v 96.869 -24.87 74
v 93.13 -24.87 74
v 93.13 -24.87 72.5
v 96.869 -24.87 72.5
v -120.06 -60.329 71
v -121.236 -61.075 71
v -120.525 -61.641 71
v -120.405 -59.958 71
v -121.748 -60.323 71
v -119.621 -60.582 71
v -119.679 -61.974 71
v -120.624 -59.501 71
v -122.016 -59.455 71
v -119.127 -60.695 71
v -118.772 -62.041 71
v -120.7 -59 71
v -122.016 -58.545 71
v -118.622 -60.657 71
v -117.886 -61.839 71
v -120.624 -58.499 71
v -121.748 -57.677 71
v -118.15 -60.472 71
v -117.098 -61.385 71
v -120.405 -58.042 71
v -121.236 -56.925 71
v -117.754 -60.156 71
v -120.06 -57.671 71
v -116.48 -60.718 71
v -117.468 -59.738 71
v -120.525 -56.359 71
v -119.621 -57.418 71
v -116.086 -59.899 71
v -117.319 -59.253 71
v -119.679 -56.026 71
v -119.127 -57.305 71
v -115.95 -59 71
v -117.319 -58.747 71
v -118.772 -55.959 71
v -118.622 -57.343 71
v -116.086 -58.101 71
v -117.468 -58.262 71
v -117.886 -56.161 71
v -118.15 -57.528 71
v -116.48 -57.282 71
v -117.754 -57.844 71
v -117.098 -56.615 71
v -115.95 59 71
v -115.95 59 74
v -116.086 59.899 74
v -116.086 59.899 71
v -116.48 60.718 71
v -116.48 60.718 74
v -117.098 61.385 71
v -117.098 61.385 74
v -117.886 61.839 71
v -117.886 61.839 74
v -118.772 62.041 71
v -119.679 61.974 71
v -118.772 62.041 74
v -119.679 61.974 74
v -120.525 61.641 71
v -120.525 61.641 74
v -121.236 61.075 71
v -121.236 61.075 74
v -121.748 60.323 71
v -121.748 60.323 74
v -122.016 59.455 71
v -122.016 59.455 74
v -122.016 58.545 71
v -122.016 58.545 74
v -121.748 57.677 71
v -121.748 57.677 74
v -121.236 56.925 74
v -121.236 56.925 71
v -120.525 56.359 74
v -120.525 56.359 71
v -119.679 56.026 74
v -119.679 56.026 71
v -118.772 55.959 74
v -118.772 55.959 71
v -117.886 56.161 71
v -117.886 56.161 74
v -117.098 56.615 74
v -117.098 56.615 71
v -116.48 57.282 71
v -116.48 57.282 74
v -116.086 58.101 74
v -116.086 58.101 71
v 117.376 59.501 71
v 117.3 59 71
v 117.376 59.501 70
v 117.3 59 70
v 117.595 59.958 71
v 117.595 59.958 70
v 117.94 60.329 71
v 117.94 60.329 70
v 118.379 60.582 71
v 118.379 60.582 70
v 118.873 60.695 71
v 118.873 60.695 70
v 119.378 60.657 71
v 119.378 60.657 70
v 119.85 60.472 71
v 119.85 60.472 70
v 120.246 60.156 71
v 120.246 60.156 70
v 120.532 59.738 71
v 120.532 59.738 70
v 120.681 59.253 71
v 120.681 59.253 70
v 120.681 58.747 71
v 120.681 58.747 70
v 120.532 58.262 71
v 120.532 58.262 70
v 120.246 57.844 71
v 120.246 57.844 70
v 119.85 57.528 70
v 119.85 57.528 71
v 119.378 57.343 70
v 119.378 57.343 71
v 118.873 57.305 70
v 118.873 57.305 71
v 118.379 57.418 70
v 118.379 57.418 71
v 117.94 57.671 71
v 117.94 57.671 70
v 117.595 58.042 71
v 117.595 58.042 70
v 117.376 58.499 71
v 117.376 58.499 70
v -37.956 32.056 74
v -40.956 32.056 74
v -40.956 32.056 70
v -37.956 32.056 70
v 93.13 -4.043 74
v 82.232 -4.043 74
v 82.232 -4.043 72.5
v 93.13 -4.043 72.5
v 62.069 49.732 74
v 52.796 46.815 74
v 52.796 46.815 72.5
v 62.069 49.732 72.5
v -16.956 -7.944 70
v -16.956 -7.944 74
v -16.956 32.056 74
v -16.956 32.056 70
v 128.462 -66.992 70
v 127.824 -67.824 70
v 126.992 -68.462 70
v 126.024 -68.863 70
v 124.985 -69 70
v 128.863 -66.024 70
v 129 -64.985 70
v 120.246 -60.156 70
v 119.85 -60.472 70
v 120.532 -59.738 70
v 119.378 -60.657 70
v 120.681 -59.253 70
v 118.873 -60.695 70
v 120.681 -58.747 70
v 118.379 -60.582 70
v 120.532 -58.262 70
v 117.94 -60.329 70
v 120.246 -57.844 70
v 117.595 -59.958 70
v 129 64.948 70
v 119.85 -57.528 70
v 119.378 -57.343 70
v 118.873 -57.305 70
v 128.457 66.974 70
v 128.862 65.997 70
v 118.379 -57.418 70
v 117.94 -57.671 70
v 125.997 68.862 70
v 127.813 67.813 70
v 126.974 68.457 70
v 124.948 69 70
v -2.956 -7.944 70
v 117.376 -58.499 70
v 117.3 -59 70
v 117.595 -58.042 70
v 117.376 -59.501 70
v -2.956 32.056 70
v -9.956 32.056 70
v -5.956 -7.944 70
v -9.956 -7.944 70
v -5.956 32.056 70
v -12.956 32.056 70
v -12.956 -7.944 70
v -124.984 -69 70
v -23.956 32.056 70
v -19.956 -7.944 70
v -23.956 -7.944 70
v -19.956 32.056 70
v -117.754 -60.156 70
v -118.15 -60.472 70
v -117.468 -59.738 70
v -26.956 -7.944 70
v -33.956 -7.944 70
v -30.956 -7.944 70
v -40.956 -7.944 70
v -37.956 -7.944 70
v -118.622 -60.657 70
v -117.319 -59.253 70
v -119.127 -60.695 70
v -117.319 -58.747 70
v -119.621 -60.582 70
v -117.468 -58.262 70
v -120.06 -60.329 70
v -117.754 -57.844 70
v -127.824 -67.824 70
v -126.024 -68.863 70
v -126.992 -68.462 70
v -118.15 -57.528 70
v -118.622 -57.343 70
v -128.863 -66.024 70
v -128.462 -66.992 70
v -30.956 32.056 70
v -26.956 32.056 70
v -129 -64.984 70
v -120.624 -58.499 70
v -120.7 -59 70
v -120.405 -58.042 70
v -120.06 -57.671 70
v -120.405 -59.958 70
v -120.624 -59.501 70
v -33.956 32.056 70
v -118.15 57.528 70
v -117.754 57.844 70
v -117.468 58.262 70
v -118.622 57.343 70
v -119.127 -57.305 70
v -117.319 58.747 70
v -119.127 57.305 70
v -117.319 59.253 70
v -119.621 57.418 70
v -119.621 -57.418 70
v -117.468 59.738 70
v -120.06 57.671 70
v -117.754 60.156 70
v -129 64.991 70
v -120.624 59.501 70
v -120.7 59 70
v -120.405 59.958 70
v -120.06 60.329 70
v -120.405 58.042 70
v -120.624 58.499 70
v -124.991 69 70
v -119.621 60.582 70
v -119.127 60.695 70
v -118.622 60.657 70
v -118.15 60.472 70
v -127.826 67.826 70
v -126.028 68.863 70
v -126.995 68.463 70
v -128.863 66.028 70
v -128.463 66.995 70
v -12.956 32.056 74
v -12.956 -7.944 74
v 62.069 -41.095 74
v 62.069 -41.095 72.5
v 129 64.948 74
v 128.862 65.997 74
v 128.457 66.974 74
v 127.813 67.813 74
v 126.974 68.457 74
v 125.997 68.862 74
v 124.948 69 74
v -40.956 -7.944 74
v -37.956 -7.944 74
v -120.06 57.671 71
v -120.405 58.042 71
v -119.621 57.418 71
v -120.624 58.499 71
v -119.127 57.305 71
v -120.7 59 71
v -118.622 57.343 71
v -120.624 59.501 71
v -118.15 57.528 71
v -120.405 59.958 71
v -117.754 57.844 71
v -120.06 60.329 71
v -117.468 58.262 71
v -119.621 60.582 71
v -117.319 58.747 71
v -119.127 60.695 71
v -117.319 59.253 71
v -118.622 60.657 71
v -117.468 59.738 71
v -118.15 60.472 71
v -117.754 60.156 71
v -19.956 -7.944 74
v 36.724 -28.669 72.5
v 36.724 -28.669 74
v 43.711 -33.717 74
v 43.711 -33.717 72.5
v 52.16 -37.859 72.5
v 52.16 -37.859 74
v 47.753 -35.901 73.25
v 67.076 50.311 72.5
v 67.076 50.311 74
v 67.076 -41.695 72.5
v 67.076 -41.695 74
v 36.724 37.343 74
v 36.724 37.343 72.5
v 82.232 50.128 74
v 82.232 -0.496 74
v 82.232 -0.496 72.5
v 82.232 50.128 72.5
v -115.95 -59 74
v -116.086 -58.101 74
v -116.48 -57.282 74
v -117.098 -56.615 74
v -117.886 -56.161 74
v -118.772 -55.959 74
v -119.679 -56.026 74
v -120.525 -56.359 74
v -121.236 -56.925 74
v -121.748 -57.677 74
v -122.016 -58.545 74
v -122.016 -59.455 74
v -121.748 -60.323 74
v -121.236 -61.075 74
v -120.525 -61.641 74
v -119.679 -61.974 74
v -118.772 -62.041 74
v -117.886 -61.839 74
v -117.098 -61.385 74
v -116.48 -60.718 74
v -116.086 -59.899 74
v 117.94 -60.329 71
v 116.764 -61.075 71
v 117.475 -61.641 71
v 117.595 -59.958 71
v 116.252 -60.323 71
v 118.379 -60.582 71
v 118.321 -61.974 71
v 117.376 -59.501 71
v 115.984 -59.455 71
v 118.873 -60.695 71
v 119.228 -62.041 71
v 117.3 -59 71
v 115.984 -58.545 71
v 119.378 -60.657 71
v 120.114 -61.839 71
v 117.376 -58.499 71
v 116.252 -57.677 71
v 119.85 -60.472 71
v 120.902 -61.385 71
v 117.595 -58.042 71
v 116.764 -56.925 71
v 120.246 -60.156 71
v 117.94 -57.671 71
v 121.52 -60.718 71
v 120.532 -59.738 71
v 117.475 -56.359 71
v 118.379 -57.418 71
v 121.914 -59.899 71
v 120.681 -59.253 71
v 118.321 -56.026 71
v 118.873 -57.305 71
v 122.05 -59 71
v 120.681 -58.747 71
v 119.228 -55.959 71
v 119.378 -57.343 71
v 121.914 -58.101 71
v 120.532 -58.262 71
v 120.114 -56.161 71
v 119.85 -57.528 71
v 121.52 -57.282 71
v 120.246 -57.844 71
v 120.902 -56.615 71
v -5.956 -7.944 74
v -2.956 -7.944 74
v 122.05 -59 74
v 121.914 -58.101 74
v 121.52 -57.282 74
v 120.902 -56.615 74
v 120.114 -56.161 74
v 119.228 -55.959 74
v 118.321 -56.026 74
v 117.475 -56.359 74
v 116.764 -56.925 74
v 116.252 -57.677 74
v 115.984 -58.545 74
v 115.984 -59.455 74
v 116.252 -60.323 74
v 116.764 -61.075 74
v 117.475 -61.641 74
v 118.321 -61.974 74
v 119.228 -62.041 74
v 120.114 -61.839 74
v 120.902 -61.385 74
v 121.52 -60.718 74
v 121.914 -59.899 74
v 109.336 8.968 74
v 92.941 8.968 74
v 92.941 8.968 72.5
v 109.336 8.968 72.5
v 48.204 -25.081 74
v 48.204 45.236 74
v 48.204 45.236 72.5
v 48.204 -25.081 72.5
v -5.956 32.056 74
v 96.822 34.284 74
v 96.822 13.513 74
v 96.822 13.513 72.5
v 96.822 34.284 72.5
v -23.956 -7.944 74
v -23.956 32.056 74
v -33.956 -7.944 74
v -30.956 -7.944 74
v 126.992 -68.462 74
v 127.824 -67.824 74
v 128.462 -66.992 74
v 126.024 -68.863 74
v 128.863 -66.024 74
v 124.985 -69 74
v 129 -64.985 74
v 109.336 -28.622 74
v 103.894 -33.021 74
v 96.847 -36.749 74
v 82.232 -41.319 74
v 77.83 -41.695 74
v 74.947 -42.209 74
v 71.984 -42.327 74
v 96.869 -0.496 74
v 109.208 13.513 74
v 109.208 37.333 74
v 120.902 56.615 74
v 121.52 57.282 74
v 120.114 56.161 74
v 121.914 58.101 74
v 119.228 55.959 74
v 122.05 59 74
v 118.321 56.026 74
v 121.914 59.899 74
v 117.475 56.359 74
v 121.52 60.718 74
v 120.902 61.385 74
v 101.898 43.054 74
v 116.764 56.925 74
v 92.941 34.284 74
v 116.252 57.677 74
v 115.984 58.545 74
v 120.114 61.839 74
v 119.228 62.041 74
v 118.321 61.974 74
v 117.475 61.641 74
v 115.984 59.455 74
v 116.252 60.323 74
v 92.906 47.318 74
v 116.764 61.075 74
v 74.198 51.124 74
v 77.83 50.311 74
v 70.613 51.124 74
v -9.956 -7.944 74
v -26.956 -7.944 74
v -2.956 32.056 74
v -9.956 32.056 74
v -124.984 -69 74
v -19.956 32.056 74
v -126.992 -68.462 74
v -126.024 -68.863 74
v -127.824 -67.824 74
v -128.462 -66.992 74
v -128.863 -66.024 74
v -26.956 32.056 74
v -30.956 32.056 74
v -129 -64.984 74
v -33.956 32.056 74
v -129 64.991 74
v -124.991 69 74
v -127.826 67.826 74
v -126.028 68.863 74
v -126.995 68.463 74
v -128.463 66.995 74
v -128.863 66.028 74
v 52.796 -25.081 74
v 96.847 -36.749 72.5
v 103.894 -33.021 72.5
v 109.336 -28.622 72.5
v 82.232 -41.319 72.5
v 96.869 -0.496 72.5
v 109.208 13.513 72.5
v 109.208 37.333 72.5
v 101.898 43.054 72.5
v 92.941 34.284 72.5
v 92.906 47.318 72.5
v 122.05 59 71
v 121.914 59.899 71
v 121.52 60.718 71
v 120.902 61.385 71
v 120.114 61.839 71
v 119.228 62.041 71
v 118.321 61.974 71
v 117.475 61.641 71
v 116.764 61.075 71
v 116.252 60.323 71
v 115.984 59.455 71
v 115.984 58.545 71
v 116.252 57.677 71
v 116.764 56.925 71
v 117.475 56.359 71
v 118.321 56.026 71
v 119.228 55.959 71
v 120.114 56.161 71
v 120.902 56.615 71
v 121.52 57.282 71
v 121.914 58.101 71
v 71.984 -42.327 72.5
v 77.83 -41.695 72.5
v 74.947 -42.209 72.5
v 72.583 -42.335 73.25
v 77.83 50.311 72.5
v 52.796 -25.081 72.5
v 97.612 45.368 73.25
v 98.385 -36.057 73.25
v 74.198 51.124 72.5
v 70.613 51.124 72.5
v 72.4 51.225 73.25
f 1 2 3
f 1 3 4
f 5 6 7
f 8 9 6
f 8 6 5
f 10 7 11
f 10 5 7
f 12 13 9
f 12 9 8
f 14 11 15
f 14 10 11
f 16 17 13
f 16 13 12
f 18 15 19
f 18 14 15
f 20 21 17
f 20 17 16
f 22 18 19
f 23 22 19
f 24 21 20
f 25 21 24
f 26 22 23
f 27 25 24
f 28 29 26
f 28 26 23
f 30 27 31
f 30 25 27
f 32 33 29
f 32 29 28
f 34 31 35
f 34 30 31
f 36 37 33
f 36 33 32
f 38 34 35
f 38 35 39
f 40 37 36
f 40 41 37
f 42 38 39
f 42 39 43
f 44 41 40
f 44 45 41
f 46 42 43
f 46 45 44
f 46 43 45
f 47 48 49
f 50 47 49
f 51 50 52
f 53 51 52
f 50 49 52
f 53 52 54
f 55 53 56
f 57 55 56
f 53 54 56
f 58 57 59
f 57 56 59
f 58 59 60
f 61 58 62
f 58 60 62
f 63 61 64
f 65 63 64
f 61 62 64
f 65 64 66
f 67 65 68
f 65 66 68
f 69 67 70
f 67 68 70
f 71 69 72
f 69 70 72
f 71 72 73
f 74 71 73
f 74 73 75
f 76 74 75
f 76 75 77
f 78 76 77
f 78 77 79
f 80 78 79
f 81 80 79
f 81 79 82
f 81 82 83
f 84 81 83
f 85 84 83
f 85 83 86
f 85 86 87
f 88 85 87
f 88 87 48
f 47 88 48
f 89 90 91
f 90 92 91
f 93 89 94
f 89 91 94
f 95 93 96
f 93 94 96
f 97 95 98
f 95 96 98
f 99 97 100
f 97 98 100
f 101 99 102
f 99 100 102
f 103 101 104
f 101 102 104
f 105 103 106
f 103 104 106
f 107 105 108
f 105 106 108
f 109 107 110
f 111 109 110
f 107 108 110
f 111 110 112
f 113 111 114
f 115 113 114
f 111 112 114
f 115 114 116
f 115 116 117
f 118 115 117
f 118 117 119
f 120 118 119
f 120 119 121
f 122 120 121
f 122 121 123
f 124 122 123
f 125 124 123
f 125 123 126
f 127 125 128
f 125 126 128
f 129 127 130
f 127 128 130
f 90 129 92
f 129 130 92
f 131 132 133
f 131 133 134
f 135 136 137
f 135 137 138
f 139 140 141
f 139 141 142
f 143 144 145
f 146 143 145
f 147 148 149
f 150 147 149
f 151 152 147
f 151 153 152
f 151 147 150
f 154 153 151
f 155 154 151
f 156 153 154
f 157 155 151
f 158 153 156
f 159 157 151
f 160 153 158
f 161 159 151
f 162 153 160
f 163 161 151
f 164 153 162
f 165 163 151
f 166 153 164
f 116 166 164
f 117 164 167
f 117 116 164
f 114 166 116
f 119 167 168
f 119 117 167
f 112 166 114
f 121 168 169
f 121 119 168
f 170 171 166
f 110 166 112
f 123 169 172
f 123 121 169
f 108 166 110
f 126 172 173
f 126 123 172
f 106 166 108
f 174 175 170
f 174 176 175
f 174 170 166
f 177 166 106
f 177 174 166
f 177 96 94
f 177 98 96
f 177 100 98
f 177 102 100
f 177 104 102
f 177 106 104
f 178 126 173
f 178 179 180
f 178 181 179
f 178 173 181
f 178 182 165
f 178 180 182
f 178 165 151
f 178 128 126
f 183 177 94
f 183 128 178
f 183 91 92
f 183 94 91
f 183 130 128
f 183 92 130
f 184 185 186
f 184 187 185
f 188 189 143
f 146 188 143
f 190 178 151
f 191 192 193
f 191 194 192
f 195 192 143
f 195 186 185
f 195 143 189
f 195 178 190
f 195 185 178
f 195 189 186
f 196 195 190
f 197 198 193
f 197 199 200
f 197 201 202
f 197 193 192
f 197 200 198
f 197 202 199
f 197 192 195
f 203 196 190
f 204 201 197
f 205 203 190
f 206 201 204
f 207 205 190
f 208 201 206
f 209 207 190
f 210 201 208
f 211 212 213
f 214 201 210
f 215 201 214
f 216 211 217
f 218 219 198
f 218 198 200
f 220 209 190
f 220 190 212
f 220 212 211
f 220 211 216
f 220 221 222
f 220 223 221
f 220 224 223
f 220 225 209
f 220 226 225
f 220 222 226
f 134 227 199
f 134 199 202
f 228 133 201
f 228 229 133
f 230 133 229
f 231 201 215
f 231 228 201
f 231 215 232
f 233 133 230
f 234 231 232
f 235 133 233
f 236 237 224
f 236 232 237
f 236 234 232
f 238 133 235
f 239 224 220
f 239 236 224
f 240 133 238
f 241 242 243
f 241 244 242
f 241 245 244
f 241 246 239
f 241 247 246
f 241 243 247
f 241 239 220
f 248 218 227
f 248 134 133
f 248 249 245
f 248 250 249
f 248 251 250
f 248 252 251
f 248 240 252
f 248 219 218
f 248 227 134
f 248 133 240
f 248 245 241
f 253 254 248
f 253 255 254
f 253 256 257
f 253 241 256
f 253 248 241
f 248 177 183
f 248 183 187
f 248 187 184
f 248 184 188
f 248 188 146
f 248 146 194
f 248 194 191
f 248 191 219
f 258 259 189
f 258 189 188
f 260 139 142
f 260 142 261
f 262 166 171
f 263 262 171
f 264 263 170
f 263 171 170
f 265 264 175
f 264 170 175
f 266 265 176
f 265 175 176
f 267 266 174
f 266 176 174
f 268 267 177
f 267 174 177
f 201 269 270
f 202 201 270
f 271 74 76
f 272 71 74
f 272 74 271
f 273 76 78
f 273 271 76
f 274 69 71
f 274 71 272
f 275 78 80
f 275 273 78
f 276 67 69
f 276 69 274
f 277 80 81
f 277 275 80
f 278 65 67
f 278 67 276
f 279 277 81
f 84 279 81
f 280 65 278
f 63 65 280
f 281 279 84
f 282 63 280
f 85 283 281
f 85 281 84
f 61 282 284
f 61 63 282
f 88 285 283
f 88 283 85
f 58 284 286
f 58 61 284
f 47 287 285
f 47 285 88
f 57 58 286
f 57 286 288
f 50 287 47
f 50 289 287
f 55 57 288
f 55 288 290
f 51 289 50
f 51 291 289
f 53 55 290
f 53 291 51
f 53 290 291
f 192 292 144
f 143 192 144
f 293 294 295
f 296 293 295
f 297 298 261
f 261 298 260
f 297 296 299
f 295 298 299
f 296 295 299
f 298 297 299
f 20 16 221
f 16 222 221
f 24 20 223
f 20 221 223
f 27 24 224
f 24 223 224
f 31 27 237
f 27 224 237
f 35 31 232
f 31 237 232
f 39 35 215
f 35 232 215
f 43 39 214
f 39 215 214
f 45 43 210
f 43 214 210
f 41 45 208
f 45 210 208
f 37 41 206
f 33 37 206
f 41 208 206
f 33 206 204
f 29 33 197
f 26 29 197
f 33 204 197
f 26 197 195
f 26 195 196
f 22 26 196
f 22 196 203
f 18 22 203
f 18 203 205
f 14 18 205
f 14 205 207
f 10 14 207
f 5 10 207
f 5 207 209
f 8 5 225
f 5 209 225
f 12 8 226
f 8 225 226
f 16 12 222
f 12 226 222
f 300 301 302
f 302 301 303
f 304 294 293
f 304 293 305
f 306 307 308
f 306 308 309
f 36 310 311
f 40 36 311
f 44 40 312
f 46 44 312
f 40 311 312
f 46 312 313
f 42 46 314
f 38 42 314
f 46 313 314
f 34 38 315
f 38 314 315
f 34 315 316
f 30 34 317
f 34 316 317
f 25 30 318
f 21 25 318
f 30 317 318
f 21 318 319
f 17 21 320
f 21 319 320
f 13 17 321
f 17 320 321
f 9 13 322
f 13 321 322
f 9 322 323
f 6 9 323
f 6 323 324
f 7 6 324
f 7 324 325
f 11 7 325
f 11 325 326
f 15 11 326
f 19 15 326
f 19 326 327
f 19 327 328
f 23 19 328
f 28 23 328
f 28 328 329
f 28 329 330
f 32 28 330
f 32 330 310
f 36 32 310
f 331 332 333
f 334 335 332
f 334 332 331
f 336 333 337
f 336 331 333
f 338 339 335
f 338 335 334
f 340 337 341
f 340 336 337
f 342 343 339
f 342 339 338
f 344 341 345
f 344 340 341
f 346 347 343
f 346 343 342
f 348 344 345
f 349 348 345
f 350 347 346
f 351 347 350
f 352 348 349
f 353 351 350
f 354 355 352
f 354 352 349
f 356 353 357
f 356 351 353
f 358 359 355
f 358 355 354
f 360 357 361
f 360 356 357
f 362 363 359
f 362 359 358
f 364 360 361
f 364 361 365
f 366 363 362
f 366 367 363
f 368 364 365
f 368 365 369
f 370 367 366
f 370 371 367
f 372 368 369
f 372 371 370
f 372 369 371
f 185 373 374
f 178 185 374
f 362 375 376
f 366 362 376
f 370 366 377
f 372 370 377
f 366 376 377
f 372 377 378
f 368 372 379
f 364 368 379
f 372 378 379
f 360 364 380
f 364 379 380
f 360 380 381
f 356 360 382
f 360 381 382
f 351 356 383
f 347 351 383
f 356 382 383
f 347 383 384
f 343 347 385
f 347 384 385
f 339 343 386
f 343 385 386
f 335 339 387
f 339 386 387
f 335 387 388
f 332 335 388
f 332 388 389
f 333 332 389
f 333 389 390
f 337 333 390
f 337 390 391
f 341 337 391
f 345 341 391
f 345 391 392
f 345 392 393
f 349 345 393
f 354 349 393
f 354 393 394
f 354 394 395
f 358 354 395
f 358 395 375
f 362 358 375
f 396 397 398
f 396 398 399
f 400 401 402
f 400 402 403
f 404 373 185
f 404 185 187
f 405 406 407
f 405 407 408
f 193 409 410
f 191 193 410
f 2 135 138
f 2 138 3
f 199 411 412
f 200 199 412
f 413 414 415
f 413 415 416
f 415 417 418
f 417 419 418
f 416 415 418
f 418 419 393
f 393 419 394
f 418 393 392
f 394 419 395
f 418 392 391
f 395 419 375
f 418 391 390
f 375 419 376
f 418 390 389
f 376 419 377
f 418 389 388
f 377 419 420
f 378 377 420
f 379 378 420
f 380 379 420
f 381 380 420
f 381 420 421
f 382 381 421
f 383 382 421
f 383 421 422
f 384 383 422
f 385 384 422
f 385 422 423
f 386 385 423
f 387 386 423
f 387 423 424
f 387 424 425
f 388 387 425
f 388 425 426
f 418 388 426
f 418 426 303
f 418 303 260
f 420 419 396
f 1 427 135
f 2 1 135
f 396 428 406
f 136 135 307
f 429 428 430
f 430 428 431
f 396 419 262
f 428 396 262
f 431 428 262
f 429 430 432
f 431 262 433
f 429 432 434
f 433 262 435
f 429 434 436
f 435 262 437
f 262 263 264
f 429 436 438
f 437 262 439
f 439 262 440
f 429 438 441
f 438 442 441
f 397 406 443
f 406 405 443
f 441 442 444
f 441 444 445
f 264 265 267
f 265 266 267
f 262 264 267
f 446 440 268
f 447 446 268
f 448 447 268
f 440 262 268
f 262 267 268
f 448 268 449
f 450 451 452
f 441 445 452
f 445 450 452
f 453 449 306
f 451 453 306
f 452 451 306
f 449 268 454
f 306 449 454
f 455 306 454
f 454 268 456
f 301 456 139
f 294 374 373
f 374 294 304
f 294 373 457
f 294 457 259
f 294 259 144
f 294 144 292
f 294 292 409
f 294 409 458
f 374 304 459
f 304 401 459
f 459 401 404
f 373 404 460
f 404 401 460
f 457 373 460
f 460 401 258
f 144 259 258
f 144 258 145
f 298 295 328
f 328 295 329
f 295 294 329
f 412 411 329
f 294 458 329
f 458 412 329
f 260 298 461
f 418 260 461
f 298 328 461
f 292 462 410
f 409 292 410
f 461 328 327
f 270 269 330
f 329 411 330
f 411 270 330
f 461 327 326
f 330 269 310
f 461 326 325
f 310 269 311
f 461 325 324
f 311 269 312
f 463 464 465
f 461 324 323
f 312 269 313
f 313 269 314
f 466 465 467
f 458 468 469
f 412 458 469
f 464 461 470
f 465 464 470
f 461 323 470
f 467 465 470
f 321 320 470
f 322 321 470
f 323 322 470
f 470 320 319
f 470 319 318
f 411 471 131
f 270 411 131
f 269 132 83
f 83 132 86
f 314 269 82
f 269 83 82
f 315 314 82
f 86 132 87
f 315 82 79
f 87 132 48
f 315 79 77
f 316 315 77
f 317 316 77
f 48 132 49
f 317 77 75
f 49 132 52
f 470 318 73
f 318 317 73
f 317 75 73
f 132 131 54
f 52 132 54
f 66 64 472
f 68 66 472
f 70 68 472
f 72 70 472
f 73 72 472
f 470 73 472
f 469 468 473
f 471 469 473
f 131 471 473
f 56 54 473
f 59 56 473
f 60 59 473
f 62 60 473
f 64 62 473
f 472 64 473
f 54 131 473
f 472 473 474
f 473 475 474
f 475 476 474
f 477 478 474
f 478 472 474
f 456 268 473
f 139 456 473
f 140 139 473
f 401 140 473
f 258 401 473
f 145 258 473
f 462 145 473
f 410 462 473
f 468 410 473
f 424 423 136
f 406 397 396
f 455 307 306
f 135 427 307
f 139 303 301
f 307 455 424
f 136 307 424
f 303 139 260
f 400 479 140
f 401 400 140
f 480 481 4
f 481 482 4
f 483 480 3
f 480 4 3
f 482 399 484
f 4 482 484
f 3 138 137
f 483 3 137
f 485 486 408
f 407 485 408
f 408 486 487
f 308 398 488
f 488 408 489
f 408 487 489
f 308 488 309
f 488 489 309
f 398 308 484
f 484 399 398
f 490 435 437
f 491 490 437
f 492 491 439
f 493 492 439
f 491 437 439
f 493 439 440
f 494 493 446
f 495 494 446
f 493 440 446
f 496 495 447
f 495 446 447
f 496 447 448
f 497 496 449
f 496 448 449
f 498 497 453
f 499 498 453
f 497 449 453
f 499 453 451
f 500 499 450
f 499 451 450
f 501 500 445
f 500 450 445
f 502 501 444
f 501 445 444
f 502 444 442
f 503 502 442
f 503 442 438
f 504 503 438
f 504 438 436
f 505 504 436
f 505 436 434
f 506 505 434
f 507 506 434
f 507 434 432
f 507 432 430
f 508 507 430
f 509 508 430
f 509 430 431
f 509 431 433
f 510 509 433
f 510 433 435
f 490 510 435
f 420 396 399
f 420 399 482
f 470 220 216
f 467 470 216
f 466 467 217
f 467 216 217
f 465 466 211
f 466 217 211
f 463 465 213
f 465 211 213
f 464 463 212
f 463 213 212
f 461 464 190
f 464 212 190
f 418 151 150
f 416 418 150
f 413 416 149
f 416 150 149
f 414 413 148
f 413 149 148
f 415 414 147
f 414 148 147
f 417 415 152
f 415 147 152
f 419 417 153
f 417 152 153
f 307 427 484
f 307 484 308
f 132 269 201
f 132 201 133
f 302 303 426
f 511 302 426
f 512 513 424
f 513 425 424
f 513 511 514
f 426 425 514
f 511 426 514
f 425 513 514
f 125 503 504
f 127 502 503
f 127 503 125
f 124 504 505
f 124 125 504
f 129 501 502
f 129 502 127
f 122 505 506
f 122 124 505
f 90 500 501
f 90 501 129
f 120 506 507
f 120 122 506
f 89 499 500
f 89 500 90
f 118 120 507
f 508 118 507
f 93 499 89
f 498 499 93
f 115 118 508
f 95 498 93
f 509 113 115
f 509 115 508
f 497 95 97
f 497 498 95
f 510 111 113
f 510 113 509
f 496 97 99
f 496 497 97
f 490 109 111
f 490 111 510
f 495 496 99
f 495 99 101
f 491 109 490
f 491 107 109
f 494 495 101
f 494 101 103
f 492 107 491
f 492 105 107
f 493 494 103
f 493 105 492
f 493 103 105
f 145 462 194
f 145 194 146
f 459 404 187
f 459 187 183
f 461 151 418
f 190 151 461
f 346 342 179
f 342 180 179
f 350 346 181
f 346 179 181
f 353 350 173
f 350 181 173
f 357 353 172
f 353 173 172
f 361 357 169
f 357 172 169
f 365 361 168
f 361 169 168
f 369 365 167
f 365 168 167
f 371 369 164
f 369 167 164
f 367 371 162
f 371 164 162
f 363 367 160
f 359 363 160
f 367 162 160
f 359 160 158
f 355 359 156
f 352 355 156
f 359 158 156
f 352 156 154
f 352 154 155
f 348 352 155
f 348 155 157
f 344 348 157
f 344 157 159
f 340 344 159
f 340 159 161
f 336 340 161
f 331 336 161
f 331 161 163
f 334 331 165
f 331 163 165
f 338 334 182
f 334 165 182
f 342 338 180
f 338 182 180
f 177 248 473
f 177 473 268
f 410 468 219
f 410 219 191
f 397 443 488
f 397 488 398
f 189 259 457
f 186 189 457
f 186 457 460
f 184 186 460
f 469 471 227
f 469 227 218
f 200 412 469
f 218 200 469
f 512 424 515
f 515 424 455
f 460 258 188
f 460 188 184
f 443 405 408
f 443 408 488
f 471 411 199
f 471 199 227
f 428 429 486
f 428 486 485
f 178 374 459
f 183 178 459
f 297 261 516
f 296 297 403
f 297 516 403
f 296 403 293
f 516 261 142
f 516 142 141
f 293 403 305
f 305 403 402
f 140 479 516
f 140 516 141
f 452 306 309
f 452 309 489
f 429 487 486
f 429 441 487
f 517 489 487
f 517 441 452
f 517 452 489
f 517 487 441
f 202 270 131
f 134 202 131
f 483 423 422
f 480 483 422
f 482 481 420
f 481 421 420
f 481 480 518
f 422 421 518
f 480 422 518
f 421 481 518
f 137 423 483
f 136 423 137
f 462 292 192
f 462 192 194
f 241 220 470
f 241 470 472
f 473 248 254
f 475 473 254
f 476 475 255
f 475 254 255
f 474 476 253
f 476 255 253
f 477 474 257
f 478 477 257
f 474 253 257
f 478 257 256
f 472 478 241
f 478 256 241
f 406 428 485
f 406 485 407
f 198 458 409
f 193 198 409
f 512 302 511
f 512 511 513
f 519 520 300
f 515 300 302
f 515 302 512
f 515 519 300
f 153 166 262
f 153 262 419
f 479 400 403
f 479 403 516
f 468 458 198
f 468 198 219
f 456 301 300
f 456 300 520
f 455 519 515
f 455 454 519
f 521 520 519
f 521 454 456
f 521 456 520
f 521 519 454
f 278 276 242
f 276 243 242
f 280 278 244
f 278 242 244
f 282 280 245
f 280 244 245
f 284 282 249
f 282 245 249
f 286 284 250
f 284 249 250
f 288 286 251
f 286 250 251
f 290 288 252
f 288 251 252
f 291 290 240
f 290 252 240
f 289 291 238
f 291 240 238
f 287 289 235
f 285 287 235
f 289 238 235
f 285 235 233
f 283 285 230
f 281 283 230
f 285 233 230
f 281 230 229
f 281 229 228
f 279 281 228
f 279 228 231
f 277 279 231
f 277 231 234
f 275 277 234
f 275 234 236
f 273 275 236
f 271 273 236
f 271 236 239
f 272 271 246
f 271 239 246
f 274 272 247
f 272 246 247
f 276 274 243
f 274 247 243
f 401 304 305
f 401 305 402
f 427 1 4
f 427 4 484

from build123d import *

# Parameters (mm, degrees)
PAD010_DEPTH        = 4
HOLE002_D           = 3.4
HOLE002_DEPTH       = 24
HOLE002_CBORE_D     = 6.1
HOLE002_CBORE_DEPTH = 3
POCKET043_DEPTH     = 1.5
SKETCH091_W         = 3
SKETCH091_H         = 40
POCKET045_DEPTH     = 4


with BuildPart() as part:
    # Sketch015 → Pad010 (new body)
    with BuildSketch(Plane.XY):
        with BuildLine():
            Line((-124.99075, 69), (124.948214, 69))
            ThreePointArc((129, 64.948214), (127.813259, 67.813259), (124.948214, 69))
            Line((129, 64.948214), (129, -64.984535))
            ThreePointArc((124.984535, -69), (127.823898, -67.823898), (129, -64.984535))
            Line((124.984535, -69), (-124.984431, -69))
            ThreePointArc((-129, -64.984431), (-127.823867, -67.823867), (-124.984431, -69))
            Line((-129, -64.984431), (-129, 64.99075))
            ThreePointArc((-124.99075, 69), (-127.825718, 67.825718), (-129, 64.99075))
        make_face()
    extrude(amount=PAD010_DEPTH)

    # Hole002
    with Locations(Plane.XY.offset(4)):
        with Locations((119, 59), (119, -59), (-119, -59), (-119, 59)):
            CounterBoreHole(HOLE002_D / 2, HOLE002_CBORE_D / 2, HOLE002_CBORE_DEPTH, depth=HOLE002_DEPTH)

    # Sketch089 (on Face5 of Hole002) → Pocket043 (cut)
    with BuildSketch(Plane.XY.offset(4)):
        with BuildLine():
            Line((36.7238, 37.343498), (48.20425, 45.236282))
            Line((48.20425, 45.236282), (48.20425, -25.081245))
            Line((48.20425, -25.081245), (52.796413, -25.081245))
            Line((52.796413, -25.081245), (52.796413, 46.814838))
            Line((52.796413, 46.814838), (62.068642, 49.73225))
            Line((62.068642, 49.73225), (62.068642, -41.094688))
            add(Edge.make_bspline(
                [(36.7238, -28.6689), (46.109684, -36.920414), (62.068642, -41.094688)],
                knots=[0, 0, 0, 1, 1, 1], degree=2))
            Line((36.7238, -28.6689), (36.7238, 37.343498))
        make_face()
        with BuildLine():
            Line((67.0756, 50.311272), (67.0756, -41.6952))
            add(Edge.make_bspline(
                [(67.0756, -41.6952), (72.712952, -42.974892), (77.829697, -41.6952)],
                knots=[0, 0, 0, 1, 1, 1], degree=2))
            Line((77.829697, -41.6952), (77.829697, 50.311272))
            add(Edge.make_bspline(
                [(67.0756, 50.311272), (72.3466, 52.139), (77.829697, 50.311272)],
                knots=[0, 0, 0, 1, 1, 1], degree=2))
        make_face()
        with BuildLine():
            Line((82.232217, -41.319175), (82.232217, -4.042601))
            Line((82.232217, -4.042601), (93.129532, -4.042601))
            Line((93.129532, -4.042601), (93.129532, -24.870003))
            Line((93.129532, -24.870003), (96.869438, -24.870003))
            Line((96.869438, -24.870003), (96.869438, -0.496148))
            Line((96.869438, -0.496148), (82.232217, -0.496148))
            Line((82.232217, -0.496148), (82.232217, 50.127594))
            add(Edge.make_bspline(
                [(82.232217, 50.127594), (99.503464, 47.005421), (109.208389, 37.33326)],
                knots=[0, 0, 0, 1, 1, 1], degree=2))
            Line((109.208389, 37.33326), (109.208389, 13.513237))
            Line((109.208389, 13.513237), (96.821526, 13.513237))
            Line((96.821526, 13.513237), (96.821526, 34.283985))
            Line((96.821526, 34.283985), (92.941208, 34.283985))
            Line((92.941208, 34.283985), (92.941208, 8.968042))
            Line((92.941208, 8.968042), (109.336434, 8.968042))
            Line((109.336434, 8.968042), (109.336434, -28.622425))
            add(Edge.make_bspline(
                [(82.232217, -41.319175), (100.984909, -37.142326), (109.336434, -28.622425)],
                knots=[0, 0, 0, 1, 1, 1], degree=2))
        make_face()
    extrude(amount=-POCKET043_DEPTH, mode=Mode.SUBTRACT)

    # Sketch091 (on Face5 of Pocket043) → Pocket045 (cut)
    with BuildSketch(Plane.XY.offset(4)):
        with Locations((-39.456103, 12.056475)):
            Rectangle(SKETCH091_W, SKETCH091_H)
        with Locations((-32.456103, 12.056475)):
            Rectangle(SKETCH091_W, SKETCH091_H)
        with Locations((-25.456103, 12.056475)):
            Rectangle(SKETCH091_W, SKETCH091_H)
        with Locations((-18.456103, 12.056475)):
            Rectangle(SKETCH091_W, SKETCH091_H)
        with Locations((-11.456103, 12.056475)):
            Rectangle(SKETCH091_W, SKETCH091_H)
        with Locations((-4.456103, 12.056475)):
            Rectangle(SKETCH091_W, SKETCH091_H)
    extrude(amount=-POCKET045_DEPTH, mode=Mode.SUBTRACT)


with BuildPart() as part_1:
    # Body005 placement: moved
    add(part.part.moved(Location((0, 0, 70))))


solid = part_1.part
